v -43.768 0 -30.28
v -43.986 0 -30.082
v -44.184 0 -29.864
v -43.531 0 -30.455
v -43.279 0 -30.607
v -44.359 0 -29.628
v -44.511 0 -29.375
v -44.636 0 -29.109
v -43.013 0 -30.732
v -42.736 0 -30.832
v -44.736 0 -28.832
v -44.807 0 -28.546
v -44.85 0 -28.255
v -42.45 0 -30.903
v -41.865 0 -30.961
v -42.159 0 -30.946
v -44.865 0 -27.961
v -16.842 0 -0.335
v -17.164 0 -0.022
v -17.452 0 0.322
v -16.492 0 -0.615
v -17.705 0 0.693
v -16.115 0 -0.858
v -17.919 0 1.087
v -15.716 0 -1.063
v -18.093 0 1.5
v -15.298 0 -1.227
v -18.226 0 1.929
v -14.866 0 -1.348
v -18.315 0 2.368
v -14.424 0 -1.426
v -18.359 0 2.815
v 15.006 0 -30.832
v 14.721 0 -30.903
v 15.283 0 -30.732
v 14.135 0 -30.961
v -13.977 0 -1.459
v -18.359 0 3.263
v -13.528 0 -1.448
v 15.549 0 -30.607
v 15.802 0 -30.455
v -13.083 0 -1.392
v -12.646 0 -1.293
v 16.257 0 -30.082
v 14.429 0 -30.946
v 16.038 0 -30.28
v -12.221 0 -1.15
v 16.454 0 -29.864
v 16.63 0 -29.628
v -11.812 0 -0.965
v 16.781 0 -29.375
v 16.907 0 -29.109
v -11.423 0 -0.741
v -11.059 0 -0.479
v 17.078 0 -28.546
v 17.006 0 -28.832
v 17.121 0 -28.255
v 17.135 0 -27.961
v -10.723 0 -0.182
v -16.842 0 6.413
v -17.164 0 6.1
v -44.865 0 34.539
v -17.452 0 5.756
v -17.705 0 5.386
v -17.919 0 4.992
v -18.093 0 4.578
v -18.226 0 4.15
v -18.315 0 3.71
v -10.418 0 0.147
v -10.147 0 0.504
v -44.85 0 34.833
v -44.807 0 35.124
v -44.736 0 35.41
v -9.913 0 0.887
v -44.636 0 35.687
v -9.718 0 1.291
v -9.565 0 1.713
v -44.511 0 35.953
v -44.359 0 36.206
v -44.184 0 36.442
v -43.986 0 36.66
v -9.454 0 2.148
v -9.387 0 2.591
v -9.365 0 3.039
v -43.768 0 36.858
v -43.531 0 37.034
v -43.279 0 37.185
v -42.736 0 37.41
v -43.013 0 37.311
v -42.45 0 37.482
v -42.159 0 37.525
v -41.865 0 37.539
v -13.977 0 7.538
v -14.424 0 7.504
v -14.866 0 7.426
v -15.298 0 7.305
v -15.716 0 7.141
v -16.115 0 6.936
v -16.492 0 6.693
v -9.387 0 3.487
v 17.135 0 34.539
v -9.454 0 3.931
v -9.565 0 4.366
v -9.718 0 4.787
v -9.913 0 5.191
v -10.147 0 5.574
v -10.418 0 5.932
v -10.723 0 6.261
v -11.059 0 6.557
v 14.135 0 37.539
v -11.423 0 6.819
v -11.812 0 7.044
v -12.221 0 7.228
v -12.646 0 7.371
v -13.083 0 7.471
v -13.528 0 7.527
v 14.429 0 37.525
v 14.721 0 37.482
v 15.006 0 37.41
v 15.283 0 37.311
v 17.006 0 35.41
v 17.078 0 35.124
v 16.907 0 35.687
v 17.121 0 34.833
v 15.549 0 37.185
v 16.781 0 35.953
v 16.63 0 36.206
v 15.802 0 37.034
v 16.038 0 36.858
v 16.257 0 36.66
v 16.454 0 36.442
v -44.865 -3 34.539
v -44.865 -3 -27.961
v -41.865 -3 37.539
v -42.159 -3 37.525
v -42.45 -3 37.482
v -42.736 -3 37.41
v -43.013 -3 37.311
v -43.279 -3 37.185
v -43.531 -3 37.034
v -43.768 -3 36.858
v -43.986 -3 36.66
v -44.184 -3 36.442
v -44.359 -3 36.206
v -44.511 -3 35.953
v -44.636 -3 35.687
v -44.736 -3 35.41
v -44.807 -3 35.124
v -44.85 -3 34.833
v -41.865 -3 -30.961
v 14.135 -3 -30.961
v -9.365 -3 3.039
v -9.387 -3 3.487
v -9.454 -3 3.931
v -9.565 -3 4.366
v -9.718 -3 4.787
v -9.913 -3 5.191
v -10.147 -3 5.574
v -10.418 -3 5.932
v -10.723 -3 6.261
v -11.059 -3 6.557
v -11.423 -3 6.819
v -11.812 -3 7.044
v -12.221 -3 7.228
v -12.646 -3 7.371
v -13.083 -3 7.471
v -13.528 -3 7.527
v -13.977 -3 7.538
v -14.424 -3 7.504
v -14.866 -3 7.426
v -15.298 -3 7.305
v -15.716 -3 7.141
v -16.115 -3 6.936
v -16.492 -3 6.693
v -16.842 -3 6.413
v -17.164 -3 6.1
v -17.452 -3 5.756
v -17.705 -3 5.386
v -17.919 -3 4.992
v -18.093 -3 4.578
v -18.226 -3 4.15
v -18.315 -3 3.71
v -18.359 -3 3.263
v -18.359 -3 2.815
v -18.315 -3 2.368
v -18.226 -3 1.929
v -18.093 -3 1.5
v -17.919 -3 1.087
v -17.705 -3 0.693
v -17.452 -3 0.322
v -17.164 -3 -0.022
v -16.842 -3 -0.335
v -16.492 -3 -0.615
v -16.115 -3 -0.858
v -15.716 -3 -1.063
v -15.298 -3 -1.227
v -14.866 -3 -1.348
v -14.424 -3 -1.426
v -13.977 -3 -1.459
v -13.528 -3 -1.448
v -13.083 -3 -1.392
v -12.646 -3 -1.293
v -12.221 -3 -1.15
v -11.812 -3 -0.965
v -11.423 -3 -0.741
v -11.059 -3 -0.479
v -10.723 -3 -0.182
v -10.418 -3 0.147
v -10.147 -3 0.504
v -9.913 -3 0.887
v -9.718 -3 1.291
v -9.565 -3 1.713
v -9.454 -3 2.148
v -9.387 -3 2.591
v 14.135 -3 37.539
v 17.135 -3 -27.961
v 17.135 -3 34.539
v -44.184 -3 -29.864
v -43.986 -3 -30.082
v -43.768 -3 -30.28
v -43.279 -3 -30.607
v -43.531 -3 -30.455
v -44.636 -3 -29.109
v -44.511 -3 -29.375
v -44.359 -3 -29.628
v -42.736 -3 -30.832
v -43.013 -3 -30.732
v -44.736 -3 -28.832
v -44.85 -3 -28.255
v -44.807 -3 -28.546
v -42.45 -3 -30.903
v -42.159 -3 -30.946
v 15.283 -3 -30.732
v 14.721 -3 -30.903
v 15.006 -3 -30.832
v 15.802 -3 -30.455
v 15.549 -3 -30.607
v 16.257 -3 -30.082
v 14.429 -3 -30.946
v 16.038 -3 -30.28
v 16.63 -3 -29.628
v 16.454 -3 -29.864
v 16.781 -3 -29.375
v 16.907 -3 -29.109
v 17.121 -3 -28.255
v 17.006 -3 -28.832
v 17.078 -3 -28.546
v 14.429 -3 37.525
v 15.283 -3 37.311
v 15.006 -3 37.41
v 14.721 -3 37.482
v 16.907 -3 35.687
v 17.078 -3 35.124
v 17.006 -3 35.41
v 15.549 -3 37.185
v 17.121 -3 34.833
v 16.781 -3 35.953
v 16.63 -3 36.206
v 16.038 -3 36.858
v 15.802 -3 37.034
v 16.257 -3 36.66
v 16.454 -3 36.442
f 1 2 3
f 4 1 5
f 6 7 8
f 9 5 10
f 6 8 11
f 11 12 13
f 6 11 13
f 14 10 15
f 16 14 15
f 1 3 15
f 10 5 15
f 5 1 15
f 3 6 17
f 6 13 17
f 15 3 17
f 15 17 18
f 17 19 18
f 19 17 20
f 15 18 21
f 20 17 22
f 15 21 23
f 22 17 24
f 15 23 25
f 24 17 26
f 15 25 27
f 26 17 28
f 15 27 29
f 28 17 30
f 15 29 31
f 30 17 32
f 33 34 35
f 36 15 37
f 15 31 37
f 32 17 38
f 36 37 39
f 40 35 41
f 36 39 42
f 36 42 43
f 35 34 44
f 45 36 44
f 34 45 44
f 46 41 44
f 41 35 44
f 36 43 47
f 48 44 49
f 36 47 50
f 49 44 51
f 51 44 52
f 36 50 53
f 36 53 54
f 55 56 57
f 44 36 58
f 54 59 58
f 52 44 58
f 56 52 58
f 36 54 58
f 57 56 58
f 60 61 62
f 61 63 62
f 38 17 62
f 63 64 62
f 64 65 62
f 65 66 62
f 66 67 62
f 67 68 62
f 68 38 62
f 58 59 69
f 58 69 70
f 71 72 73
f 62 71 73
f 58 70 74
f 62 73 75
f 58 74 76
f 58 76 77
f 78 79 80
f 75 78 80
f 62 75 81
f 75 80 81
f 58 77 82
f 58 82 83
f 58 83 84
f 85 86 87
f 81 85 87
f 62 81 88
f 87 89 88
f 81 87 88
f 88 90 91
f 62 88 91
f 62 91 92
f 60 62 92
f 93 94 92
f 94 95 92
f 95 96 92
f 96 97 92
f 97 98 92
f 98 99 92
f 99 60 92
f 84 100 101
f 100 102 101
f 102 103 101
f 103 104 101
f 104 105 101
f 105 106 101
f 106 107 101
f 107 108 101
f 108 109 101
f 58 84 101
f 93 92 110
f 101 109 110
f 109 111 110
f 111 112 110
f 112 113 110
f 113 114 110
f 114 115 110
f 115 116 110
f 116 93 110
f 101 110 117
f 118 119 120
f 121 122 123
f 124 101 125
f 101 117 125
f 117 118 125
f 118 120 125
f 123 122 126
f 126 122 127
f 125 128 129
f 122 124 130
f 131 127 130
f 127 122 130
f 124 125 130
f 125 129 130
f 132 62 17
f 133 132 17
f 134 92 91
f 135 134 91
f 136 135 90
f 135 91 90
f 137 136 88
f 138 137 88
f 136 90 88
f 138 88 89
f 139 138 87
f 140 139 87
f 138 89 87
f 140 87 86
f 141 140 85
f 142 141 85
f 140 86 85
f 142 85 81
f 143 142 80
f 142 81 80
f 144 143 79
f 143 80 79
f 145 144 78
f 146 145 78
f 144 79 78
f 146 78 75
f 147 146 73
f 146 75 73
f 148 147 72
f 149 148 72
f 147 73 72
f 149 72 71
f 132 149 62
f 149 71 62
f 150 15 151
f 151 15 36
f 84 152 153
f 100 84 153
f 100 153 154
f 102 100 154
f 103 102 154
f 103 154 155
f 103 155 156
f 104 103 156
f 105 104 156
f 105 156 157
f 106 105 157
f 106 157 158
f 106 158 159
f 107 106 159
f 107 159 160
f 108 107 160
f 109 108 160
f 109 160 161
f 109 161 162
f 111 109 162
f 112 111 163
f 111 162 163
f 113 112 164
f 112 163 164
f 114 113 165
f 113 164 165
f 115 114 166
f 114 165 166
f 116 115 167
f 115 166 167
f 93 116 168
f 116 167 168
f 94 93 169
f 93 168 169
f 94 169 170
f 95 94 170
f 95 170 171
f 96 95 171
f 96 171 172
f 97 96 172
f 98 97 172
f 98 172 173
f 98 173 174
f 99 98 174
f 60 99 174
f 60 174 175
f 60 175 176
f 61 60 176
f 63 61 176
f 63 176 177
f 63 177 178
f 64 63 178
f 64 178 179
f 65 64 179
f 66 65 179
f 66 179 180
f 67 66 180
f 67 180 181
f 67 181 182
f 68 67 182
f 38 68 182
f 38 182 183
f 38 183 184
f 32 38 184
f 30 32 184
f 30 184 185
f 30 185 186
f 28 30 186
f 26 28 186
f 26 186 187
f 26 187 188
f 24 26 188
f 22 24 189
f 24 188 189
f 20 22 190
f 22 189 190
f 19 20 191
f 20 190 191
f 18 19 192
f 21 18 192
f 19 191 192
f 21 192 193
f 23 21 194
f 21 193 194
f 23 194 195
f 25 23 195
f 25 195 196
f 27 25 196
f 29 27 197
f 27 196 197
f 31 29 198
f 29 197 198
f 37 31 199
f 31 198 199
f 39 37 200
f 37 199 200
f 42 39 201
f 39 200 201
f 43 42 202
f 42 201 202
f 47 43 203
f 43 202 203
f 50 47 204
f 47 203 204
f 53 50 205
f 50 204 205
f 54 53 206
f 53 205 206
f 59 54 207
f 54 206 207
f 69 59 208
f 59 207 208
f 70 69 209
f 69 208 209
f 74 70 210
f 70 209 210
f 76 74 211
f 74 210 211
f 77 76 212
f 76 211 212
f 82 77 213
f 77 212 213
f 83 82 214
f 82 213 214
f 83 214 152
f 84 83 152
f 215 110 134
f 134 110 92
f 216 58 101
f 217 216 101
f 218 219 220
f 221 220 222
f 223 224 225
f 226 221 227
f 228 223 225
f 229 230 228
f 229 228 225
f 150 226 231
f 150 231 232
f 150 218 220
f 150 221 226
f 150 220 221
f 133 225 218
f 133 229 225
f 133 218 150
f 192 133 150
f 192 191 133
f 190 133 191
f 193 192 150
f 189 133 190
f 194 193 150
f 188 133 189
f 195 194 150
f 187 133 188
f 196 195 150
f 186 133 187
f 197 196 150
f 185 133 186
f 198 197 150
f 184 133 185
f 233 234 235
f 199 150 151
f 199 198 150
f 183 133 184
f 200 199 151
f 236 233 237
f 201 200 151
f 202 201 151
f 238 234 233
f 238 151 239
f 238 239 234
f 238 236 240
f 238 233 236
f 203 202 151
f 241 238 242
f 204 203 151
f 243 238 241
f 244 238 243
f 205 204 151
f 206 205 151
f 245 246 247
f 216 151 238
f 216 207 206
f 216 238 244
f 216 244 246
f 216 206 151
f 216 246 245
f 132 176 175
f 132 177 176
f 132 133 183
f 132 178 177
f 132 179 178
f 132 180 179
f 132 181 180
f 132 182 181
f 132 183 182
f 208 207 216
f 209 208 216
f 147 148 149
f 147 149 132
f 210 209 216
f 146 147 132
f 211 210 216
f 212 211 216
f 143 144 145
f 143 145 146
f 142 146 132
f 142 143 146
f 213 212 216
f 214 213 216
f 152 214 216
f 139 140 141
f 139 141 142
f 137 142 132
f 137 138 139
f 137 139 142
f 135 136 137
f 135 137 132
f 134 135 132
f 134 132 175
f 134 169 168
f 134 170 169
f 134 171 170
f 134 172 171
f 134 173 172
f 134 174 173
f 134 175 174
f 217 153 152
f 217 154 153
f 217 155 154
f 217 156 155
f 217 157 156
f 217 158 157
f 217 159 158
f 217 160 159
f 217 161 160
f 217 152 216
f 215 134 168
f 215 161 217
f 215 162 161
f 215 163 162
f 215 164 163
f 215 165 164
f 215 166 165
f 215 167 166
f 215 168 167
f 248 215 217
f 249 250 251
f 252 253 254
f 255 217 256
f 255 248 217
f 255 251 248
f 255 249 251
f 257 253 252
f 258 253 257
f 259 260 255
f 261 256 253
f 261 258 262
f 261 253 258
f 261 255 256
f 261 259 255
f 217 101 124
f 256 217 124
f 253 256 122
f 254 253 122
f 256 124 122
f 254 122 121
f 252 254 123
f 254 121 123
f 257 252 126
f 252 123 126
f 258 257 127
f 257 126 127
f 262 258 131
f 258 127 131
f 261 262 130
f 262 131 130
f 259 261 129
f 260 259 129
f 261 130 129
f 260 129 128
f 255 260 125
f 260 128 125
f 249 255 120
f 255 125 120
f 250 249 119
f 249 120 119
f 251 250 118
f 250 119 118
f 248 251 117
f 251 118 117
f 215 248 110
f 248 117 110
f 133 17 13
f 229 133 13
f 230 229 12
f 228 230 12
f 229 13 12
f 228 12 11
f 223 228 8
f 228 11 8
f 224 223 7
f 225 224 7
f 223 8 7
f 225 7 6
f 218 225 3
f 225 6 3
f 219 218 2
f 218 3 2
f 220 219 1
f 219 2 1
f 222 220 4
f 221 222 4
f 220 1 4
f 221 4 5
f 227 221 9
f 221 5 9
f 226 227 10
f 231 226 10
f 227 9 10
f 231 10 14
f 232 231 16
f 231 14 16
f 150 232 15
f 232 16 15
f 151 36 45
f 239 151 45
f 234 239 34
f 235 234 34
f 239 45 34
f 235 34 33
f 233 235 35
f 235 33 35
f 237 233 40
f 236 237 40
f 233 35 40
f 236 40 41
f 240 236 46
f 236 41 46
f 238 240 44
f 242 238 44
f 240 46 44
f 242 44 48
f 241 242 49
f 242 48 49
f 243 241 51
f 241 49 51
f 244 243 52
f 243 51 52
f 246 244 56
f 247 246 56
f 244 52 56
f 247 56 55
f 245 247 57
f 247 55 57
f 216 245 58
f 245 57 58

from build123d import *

# Parameters (mm, degrees)
F1_DEPTH = 3
F2_R     = 4.5
F3_DEPTH = 25


with BuildPart() as f1:
    # F0 (on Front) → F1 (new body)
    with BuildSketch(Plane.XZ):
        with BuildLine():
            Line((14.135233, 37.539159), (-41.864767, 37.539159))
            ThreePointArc((-41.864767, 37.539159), (-43.986087, 36.660479), (-44.864767, 34.539159))
            Line((-44.864767, 34.539159), (-44.864767, -27.960841))
            ThreePointArc((-44.864767, -27.960841), (-43.986087, -30.082161), (-41.864767, -30.960841))
            Line((-41.864767, -30.960841), (14.135233, -30.960841))
            ThreePointArc((14.135233, -30.960841), (16.256553, -30.082161), (17.135233, -27.960841))
            Line((17.135233, -27.960841), (17.135233, 34.539159))
            ThreePointArc((17.135233, 34.539159), (16.256553, 36.660479), (14.135233, 37.539159))
        make_face()
    extrude(amount=F1_DEPTH)

    # F2 (on face) → F3 (cut)
    with BuildSketch(Plane.XZ.offset(3)):
        with Locations((-13.864767, 3.039159)):
            Circle(F2_R)
    extrude(amount=-F3_DEPTH, mode=Mode.SUBTRACT)


solid = f1.part
